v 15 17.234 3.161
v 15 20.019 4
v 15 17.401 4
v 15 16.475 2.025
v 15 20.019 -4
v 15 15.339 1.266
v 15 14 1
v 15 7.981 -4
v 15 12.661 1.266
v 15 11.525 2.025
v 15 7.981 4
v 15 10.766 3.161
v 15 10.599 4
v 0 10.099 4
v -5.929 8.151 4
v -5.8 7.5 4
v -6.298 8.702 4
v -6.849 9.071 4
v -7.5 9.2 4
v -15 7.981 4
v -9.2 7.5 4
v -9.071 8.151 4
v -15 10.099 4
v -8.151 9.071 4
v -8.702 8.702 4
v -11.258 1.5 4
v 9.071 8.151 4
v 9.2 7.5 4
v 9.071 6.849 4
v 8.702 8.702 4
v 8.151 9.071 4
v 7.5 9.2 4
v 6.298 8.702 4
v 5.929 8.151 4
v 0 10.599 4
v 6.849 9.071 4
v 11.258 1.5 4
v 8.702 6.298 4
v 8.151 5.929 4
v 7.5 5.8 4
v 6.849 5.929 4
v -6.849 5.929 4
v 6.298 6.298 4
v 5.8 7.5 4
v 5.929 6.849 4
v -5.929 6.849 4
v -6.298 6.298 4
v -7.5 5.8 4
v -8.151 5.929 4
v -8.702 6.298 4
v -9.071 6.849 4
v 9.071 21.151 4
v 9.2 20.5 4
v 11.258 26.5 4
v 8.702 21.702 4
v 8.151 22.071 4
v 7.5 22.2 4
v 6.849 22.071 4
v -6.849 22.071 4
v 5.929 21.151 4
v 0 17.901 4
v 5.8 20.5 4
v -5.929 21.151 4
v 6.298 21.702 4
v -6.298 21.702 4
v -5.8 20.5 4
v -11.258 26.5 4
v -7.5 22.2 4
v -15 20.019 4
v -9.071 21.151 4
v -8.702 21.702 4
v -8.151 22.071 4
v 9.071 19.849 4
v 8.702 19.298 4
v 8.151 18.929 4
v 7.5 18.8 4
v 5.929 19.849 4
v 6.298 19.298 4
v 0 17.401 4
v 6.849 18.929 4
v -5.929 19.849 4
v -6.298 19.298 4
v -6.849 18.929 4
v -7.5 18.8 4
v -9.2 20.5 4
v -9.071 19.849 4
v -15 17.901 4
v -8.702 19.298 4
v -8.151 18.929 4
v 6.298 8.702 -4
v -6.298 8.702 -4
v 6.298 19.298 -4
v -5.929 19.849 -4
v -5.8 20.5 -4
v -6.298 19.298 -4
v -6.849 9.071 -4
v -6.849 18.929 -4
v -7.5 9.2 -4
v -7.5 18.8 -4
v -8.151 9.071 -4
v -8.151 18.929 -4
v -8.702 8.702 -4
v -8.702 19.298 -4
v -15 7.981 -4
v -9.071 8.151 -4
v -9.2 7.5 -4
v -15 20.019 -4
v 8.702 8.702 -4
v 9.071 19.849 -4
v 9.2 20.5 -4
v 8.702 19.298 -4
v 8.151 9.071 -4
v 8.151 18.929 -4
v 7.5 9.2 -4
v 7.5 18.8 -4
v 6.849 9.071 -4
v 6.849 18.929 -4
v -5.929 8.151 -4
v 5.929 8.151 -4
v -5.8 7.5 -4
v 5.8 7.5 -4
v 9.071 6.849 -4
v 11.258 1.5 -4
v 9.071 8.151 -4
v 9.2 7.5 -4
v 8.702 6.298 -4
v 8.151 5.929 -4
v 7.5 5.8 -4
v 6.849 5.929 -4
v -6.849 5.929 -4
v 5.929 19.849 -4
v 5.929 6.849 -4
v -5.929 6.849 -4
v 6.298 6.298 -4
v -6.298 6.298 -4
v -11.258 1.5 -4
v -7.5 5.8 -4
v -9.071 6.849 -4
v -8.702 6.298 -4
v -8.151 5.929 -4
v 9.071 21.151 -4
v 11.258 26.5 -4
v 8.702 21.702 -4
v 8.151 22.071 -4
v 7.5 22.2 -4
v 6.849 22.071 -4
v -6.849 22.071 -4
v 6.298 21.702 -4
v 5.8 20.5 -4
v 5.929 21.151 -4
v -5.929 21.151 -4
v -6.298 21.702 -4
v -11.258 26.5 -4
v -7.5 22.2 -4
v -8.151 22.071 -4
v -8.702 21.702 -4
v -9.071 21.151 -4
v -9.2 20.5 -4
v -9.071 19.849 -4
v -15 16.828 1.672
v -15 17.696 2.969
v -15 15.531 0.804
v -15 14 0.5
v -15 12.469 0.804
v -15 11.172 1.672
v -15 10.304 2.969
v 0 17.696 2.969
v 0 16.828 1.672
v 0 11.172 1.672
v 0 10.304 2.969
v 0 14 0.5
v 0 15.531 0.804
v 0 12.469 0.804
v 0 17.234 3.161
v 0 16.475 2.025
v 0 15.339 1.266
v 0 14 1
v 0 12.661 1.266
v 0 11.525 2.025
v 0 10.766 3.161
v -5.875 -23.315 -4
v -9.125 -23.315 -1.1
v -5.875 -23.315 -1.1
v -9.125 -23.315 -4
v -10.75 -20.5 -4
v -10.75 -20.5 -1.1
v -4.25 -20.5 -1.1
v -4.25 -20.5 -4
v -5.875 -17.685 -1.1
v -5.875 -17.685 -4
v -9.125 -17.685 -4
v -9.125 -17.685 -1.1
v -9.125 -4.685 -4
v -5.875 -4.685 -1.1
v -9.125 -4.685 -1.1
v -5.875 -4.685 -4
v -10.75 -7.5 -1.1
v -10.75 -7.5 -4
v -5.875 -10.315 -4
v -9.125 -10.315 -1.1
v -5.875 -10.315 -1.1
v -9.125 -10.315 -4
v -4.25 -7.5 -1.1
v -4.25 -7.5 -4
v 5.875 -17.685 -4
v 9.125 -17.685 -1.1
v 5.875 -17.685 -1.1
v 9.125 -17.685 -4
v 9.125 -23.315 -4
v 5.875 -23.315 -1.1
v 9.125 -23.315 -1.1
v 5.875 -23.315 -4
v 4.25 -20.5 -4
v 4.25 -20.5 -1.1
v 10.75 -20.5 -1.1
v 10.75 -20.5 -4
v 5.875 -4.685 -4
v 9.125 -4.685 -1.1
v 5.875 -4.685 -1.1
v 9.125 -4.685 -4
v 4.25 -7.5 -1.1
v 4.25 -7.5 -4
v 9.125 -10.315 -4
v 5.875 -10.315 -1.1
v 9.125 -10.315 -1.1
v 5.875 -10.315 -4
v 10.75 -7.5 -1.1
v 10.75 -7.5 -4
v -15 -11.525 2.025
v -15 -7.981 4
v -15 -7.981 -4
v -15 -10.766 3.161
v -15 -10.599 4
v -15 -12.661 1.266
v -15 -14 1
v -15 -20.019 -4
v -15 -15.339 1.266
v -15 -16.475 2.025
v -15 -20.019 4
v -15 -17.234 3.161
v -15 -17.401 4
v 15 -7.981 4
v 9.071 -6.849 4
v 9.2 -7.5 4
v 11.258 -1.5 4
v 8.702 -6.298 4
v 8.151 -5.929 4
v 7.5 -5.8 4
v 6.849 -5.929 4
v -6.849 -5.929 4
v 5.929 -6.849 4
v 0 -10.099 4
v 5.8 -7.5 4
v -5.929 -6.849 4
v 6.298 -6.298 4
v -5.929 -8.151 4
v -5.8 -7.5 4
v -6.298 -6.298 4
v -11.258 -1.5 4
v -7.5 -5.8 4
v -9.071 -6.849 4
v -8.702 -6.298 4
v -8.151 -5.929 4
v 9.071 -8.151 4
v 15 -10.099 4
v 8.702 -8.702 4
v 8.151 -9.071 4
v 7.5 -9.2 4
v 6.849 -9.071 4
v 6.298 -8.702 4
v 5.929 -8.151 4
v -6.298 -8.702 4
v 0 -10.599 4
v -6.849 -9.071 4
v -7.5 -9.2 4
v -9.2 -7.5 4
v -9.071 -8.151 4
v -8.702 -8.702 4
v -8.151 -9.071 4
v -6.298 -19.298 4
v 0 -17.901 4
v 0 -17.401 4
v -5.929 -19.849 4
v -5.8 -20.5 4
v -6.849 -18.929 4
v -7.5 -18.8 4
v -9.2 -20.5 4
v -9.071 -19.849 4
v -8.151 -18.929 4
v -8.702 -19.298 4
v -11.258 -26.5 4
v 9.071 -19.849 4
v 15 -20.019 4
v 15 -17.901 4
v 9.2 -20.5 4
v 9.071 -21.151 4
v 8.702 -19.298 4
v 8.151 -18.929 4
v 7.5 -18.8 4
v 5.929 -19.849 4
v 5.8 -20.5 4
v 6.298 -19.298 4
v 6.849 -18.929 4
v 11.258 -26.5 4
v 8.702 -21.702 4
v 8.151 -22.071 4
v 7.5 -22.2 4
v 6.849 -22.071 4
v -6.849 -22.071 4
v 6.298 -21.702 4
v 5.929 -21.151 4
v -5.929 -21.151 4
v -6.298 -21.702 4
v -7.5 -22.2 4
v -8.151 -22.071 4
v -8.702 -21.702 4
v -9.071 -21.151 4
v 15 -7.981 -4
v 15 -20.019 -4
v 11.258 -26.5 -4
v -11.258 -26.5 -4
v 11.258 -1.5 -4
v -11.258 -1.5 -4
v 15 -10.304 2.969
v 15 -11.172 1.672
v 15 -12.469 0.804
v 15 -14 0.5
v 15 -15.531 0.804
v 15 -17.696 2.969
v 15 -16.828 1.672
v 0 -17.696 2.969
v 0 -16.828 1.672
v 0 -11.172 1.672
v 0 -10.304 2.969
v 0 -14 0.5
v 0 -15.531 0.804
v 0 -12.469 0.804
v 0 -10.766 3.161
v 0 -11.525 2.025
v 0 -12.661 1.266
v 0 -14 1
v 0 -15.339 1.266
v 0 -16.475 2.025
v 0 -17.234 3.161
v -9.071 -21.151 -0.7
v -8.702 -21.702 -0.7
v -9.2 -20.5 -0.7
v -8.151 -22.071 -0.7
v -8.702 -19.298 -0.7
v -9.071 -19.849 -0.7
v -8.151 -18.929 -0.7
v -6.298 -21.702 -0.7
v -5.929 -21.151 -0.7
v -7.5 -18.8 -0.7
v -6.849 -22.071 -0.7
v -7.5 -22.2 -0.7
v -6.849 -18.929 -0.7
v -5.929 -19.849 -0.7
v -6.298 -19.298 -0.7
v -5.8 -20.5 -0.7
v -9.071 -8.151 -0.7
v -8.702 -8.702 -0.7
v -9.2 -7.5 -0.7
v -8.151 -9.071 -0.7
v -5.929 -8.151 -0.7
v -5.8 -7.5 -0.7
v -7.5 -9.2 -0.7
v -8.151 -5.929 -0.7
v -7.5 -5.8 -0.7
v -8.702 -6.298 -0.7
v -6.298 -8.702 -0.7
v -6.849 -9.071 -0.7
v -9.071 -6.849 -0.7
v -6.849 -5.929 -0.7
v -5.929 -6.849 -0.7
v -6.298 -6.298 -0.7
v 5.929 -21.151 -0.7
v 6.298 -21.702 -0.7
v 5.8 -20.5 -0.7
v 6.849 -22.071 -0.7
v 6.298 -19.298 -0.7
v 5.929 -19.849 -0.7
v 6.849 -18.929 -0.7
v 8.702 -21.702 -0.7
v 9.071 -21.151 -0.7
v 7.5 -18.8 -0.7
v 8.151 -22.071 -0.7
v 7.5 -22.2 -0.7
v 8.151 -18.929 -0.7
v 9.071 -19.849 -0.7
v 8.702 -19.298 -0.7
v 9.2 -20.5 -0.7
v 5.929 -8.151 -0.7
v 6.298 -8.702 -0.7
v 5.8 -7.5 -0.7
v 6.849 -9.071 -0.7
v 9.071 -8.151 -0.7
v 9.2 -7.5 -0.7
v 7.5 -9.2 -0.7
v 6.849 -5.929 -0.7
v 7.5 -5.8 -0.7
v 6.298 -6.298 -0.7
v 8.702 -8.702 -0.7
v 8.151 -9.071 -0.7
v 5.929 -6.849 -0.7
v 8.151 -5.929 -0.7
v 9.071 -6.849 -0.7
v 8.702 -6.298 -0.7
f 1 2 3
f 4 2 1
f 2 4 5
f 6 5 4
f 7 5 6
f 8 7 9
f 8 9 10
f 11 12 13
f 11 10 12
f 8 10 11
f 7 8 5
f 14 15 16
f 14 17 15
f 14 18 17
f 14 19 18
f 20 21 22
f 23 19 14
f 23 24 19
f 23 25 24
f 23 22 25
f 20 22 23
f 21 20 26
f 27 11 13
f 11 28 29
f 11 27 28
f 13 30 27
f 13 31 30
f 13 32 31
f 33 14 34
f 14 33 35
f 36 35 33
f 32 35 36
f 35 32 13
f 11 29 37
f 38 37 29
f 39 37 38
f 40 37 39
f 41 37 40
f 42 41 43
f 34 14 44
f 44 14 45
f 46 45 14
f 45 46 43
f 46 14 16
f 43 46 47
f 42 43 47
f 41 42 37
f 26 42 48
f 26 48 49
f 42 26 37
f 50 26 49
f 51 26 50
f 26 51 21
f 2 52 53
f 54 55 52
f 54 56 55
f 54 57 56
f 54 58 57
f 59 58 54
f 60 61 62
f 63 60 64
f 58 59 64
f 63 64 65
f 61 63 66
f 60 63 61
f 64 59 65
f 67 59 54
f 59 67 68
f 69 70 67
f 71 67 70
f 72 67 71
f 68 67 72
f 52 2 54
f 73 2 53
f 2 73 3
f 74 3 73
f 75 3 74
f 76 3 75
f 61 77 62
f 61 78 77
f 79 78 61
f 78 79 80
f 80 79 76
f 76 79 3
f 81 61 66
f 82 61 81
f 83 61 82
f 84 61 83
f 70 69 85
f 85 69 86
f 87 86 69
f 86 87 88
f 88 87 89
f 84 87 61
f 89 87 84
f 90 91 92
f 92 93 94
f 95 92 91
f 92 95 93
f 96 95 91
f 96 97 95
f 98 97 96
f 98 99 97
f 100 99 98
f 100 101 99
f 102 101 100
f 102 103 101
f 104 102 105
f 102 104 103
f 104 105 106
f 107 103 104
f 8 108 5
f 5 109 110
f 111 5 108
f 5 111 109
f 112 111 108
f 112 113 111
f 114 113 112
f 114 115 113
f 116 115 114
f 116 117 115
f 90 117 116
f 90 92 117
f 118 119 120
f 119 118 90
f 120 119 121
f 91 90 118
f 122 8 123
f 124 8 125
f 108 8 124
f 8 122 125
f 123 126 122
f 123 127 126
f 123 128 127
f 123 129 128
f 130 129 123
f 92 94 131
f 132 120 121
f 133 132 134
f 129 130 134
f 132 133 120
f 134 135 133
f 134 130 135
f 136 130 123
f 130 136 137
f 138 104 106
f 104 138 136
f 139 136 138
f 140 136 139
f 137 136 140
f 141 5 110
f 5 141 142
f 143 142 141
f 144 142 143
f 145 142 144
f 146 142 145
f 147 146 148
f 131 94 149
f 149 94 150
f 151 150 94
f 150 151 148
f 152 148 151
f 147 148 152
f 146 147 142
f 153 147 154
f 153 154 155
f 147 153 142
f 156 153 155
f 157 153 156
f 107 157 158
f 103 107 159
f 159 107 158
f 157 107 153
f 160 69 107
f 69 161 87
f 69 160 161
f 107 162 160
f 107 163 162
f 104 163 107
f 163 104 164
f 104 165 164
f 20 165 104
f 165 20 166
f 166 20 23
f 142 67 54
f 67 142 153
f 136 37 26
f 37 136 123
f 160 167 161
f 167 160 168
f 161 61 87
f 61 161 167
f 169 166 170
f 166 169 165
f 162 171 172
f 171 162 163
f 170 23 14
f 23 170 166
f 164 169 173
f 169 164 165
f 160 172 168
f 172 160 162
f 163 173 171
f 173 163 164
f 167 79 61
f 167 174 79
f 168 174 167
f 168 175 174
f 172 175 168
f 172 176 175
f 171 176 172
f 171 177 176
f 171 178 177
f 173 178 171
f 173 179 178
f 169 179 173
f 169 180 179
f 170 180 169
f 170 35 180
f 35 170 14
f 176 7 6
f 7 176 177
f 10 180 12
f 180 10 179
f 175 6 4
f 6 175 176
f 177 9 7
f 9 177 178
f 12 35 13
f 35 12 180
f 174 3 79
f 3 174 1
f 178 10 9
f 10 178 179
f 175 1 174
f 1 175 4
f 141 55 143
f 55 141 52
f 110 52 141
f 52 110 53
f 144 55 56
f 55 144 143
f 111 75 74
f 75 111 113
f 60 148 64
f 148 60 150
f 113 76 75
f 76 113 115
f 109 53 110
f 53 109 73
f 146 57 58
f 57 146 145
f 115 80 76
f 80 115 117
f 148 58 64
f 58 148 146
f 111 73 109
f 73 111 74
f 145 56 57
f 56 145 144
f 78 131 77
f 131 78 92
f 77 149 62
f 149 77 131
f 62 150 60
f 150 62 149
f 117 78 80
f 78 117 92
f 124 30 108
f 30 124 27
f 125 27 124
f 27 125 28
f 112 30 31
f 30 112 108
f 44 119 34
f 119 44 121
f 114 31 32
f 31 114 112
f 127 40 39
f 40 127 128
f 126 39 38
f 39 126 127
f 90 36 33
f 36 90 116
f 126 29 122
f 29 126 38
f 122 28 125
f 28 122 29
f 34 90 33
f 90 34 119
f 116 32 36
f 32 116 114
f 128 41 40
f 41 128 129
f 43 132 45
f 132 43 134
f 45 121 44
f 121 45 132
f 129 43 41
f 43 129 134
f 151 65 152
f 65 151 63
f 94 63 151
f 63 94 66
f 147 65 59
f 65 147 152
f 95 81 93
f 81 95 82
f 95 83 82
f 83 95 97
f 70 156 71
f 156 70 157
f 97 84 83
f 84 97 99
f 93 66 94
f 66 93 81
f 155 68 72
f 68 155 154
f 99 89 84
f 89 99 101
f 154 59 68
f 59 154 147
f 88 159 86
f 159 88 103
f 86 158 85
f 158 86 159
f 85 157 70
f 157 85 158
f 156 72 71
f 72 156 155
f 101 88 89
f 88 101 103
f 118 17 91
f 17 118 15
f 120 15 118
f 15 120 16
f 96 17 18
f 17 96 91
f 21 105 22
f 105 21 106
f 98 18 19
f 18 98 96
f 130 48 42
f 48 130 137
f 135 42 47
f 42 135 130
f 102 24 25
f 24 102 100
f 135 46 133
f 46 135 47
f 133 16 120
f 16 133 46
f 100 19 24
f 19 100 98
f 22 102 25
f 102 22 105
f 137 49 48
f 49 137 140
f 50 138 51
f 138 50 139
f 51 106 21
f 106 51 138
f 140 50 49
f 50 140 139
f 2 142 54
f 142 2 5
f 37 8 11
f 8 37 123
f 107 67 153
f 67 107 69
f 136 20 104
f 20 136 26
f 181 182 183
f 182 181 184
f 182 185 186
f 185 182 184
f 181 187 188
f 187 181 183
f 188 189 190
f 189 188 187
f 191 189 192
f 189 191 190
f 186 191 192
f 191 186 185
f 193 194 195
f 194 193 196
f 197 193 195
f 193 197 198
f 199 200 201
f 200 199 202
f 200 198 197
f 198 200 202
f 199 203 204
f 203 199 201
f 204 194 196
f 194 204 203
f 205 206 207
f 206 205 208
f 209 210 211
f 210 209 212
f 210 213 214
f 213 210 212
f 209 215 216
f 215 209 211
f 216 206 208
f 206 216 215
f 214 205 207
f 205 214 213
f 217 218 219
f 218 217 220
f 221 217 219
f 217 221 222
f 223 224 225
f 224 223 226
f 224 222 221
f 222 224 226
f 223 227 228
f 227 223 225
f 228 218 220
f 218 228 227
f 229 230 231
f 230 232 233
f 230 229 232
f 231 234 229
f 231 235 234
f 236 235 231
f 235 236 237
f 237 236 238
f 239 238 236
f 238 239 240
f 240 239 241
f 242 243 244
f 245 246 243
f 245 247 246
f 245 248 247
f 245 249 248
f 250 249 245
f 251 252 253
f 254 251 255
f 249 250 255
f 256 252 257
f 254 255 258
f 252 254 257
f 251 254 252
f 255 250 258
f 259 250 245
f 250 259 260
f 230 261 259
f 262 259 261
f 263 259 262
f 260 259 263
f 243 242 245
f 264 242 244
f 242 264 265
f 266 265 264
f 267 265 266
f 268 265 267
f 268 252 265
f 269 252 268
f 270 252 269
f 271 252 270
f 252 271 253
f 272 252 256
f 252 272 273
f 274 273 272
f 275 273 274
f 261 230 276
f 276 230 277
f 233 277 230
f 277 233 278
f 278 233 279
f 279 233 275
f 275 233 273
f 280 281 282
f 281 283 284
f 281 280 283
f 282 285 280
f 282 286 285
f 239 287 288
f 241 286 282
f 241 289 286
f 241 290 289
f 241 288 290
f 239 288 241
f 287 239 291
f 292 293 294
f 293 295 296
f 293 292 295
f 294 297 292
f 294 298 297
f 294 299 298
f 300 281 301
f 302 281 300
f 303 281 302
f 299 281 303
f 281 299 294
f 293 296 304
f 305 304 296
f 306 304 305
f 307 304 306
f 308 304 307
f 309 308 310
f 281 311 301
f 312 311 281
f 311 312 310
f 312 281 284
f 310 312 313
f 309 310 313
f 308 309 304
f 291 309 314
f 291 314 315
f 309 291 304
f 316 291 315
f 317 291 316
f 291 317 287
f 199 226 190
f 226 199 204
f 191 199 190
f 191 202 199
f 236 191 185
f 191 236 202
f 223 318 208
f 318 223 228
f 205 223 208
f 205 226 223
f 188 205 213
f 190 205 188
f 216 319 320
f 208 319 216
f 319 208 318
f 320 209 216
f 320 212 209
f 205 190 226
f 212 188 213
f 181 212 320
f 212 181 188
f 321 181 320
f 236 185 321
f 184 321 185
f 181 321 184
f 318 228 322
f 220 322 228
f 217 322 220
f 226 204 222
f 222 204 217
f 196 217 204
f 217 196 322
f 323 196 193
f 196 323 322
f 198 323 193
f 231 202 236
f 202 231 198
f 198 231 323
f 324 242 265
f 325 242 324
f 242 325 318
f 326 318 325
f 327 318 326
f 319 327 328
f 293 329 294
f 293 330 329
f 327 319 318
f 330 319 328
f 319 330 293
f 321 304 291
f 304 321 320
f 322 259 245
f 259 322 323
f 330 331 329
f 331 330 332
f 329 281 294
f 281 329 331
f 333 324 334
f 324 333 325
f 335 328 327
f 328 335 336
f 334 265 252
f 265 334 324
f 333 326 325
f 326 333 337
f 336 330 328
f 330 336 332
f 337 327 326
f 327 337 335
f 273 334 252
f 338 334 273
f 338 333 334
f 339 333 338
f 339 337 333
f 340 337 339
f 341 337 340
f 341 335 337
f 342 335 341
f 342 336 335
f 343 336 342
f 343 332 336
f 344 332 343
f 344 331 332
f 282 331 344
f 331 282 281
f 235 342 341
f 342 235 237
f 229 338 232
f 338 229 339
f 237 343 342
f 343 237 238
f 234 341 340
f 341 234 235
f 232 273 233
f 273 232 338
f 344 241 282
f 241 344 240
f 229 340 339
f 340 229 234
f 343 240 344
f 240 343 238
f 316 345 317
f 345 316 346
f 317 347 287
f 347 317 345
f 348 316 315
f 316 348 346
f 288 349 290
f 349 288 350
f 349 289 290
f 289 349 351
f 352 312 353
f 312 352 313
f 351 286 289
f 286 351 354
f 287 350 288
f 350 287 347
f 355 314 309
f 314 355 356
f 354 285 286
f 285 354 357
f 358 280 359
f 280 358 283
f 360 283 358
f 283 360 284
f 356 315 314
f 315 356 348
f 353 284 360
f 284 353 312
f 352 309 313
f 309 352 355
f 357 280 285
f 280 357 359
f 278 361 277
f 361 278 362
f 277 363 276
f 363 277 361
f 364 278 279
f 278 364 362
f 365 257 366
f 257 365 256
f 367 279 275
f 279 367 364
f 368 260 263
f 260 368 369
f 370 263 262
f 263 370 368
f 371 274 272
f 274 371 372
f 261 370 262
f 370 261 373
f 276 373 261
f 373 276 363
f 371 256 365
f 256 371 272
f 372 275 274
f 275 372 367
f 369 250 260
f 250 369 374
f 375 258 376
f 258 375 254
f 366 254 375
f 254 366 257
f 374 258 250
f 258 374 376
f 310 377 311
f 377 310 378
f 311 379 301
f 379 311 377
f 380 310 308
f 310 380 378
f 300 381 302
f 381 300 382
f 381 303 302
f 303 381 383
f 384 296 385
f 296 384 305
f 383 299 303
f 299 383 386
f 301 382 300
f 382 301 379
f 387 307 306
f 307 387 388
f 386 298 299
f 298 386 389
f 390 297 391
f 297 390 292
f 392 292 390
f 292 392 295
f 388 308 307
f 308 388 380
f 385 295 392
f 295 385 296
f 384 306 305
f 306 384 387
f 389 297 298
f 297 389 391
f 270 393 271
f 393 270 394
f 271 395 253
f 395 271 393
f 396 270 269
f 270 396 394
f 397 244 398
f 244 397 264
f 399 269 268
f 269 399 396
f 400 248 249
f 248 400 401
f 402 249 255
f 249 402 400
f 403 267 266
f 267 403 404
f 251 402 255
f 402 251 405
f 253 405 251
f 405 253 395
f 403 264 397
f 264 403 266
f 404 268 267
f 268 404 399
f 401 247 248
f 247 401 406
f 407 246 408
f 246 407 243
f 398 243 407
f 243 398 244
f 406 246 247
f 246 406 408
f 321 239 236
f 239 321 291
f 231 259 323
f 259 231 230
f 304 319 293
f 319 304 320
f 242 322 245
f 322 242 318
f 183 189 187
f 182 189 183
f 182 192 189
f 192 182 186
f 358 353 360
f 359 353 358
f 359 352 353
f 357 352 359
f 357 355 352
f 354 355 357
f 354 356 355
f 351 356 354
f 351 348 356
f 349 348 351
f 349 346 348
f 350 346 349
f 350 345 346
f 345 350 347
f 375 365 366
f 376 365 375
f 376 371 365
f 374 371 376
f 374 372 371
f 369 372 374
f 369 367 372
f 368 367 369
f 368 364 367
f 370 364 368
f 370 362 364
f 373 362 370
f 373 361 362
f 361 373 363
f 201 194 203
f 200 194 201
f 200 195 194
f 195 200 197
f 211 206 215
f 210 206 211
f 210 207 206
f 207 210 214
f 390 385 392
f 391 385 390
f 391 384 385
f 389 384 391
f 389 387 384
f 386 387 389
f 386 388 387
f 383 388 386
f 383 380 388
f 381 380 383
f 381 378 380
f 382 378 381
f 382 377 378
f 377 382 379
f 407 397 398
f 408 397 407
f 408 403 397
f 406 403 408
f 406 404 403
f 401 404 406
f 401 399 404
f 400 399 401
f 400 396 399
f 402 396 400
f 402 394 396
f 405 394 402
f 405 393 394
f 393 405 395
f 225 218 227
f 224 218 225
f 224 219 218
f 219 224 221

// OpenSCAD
holeX = 7.5;
holeY = 6.5;

holeR = 3.4 / 2;
nutR = 3.25;
nutH = 3;
corner_cut = 26;

studding_dia = 8.0;
shaft_dia = 7.0;

module coupling(c){
    union(){
        difference(){
            cube(size = [30,25,8], center = true);

            if(c==1){
                //slot
            	*cube(size = [2,40,30], center = true);
                
                //nut holes
            	translate([ holeX,  holeY, nutH/2 - 4.01]) cylinder(h = nutH, r=nutR, $fn=6, center=true);
            	translate([ holeX, -holeY, nutH/2 - 4.01]) cylinder(h = nutH, r=nutR, $fn=6, center=true);
            	translate([-holeX,  holeY, nutH/2 - 4.01]) cylinder(h = nutH, r=nutR, $fn=6, center=true);
            	translate([-holeX, -holeY, nutH/2 - 4.01]) cylinder(h = nutH, r=nutR, $fn=6, center=true);
            }

            //shaft groves
            translate([ -16, 0, 4.5]) rotate([0,90,0]) cylinder(h = 16, r=studding_dia / 2, $fn=16);
            translate([-0.5, 0, 4.5]) rotate([0,90,0]) cylinder(h = 16, r=shaft_dia / 2,    $fn=16);

            //screw holes
            translate([ holeX,  holeY, -10]) cylinder(h = 20, r=holeR, $fn=16);
            translate([ holeX, -holeY, -10]) cylinder(h = 20, r=holeR, $fn=16);
            translate([-holeX,  holeY, -10]) cylinder(h = 20, r=holeR, $fn=16);
            translate([-holeX, -holeY, -10]) cylinder(h = 20, r=holeR, $fn=16);

            //corners
            rotate([0,0,30])   translate([corner_cut, 0, 0]) cube(size = [20,40,20], center = true);
            rotate([0,0,-30])  translate([corner_cut, 0, 0]) cube(size = [20,40,20], center = true);
            rotate([0,0,150])  translate([corner_cut, 0, 0]) cube(size = [20,40,20], center = true);
            rotate([0,0,-150]) translate([corner_cut, 0, 0]) cube(size = [20,40,20], center = true);
        }
        if(c==1){
            // bridge
        	translate([ holeX,  holeY, nutH-3.9]) cylinder(h = 0.4, r=nutR+0.1, $fn=6, center=true);
        	translate([ holeX, -holeY, nutH-3.9]) cylinder(h = 0.4, r=nutR+0.1, $fn=6, center=true);
        	translate([-holeX,  holeY, nutH-3.9]) cylinder(h = 0.4, r=nutR+0.1, $fn=6, center=true);
        	translate([-holeX, -holeY, nutH-3.9]) cylinder(h = 0.4, r=nutR+0.1, $fn=6, center=true);
        }
    }
}

translate([0, 14, 0]) coupling(c=0);
translate([0, -14, 0]) rotate([0,0,180]) coupling(c=1);
